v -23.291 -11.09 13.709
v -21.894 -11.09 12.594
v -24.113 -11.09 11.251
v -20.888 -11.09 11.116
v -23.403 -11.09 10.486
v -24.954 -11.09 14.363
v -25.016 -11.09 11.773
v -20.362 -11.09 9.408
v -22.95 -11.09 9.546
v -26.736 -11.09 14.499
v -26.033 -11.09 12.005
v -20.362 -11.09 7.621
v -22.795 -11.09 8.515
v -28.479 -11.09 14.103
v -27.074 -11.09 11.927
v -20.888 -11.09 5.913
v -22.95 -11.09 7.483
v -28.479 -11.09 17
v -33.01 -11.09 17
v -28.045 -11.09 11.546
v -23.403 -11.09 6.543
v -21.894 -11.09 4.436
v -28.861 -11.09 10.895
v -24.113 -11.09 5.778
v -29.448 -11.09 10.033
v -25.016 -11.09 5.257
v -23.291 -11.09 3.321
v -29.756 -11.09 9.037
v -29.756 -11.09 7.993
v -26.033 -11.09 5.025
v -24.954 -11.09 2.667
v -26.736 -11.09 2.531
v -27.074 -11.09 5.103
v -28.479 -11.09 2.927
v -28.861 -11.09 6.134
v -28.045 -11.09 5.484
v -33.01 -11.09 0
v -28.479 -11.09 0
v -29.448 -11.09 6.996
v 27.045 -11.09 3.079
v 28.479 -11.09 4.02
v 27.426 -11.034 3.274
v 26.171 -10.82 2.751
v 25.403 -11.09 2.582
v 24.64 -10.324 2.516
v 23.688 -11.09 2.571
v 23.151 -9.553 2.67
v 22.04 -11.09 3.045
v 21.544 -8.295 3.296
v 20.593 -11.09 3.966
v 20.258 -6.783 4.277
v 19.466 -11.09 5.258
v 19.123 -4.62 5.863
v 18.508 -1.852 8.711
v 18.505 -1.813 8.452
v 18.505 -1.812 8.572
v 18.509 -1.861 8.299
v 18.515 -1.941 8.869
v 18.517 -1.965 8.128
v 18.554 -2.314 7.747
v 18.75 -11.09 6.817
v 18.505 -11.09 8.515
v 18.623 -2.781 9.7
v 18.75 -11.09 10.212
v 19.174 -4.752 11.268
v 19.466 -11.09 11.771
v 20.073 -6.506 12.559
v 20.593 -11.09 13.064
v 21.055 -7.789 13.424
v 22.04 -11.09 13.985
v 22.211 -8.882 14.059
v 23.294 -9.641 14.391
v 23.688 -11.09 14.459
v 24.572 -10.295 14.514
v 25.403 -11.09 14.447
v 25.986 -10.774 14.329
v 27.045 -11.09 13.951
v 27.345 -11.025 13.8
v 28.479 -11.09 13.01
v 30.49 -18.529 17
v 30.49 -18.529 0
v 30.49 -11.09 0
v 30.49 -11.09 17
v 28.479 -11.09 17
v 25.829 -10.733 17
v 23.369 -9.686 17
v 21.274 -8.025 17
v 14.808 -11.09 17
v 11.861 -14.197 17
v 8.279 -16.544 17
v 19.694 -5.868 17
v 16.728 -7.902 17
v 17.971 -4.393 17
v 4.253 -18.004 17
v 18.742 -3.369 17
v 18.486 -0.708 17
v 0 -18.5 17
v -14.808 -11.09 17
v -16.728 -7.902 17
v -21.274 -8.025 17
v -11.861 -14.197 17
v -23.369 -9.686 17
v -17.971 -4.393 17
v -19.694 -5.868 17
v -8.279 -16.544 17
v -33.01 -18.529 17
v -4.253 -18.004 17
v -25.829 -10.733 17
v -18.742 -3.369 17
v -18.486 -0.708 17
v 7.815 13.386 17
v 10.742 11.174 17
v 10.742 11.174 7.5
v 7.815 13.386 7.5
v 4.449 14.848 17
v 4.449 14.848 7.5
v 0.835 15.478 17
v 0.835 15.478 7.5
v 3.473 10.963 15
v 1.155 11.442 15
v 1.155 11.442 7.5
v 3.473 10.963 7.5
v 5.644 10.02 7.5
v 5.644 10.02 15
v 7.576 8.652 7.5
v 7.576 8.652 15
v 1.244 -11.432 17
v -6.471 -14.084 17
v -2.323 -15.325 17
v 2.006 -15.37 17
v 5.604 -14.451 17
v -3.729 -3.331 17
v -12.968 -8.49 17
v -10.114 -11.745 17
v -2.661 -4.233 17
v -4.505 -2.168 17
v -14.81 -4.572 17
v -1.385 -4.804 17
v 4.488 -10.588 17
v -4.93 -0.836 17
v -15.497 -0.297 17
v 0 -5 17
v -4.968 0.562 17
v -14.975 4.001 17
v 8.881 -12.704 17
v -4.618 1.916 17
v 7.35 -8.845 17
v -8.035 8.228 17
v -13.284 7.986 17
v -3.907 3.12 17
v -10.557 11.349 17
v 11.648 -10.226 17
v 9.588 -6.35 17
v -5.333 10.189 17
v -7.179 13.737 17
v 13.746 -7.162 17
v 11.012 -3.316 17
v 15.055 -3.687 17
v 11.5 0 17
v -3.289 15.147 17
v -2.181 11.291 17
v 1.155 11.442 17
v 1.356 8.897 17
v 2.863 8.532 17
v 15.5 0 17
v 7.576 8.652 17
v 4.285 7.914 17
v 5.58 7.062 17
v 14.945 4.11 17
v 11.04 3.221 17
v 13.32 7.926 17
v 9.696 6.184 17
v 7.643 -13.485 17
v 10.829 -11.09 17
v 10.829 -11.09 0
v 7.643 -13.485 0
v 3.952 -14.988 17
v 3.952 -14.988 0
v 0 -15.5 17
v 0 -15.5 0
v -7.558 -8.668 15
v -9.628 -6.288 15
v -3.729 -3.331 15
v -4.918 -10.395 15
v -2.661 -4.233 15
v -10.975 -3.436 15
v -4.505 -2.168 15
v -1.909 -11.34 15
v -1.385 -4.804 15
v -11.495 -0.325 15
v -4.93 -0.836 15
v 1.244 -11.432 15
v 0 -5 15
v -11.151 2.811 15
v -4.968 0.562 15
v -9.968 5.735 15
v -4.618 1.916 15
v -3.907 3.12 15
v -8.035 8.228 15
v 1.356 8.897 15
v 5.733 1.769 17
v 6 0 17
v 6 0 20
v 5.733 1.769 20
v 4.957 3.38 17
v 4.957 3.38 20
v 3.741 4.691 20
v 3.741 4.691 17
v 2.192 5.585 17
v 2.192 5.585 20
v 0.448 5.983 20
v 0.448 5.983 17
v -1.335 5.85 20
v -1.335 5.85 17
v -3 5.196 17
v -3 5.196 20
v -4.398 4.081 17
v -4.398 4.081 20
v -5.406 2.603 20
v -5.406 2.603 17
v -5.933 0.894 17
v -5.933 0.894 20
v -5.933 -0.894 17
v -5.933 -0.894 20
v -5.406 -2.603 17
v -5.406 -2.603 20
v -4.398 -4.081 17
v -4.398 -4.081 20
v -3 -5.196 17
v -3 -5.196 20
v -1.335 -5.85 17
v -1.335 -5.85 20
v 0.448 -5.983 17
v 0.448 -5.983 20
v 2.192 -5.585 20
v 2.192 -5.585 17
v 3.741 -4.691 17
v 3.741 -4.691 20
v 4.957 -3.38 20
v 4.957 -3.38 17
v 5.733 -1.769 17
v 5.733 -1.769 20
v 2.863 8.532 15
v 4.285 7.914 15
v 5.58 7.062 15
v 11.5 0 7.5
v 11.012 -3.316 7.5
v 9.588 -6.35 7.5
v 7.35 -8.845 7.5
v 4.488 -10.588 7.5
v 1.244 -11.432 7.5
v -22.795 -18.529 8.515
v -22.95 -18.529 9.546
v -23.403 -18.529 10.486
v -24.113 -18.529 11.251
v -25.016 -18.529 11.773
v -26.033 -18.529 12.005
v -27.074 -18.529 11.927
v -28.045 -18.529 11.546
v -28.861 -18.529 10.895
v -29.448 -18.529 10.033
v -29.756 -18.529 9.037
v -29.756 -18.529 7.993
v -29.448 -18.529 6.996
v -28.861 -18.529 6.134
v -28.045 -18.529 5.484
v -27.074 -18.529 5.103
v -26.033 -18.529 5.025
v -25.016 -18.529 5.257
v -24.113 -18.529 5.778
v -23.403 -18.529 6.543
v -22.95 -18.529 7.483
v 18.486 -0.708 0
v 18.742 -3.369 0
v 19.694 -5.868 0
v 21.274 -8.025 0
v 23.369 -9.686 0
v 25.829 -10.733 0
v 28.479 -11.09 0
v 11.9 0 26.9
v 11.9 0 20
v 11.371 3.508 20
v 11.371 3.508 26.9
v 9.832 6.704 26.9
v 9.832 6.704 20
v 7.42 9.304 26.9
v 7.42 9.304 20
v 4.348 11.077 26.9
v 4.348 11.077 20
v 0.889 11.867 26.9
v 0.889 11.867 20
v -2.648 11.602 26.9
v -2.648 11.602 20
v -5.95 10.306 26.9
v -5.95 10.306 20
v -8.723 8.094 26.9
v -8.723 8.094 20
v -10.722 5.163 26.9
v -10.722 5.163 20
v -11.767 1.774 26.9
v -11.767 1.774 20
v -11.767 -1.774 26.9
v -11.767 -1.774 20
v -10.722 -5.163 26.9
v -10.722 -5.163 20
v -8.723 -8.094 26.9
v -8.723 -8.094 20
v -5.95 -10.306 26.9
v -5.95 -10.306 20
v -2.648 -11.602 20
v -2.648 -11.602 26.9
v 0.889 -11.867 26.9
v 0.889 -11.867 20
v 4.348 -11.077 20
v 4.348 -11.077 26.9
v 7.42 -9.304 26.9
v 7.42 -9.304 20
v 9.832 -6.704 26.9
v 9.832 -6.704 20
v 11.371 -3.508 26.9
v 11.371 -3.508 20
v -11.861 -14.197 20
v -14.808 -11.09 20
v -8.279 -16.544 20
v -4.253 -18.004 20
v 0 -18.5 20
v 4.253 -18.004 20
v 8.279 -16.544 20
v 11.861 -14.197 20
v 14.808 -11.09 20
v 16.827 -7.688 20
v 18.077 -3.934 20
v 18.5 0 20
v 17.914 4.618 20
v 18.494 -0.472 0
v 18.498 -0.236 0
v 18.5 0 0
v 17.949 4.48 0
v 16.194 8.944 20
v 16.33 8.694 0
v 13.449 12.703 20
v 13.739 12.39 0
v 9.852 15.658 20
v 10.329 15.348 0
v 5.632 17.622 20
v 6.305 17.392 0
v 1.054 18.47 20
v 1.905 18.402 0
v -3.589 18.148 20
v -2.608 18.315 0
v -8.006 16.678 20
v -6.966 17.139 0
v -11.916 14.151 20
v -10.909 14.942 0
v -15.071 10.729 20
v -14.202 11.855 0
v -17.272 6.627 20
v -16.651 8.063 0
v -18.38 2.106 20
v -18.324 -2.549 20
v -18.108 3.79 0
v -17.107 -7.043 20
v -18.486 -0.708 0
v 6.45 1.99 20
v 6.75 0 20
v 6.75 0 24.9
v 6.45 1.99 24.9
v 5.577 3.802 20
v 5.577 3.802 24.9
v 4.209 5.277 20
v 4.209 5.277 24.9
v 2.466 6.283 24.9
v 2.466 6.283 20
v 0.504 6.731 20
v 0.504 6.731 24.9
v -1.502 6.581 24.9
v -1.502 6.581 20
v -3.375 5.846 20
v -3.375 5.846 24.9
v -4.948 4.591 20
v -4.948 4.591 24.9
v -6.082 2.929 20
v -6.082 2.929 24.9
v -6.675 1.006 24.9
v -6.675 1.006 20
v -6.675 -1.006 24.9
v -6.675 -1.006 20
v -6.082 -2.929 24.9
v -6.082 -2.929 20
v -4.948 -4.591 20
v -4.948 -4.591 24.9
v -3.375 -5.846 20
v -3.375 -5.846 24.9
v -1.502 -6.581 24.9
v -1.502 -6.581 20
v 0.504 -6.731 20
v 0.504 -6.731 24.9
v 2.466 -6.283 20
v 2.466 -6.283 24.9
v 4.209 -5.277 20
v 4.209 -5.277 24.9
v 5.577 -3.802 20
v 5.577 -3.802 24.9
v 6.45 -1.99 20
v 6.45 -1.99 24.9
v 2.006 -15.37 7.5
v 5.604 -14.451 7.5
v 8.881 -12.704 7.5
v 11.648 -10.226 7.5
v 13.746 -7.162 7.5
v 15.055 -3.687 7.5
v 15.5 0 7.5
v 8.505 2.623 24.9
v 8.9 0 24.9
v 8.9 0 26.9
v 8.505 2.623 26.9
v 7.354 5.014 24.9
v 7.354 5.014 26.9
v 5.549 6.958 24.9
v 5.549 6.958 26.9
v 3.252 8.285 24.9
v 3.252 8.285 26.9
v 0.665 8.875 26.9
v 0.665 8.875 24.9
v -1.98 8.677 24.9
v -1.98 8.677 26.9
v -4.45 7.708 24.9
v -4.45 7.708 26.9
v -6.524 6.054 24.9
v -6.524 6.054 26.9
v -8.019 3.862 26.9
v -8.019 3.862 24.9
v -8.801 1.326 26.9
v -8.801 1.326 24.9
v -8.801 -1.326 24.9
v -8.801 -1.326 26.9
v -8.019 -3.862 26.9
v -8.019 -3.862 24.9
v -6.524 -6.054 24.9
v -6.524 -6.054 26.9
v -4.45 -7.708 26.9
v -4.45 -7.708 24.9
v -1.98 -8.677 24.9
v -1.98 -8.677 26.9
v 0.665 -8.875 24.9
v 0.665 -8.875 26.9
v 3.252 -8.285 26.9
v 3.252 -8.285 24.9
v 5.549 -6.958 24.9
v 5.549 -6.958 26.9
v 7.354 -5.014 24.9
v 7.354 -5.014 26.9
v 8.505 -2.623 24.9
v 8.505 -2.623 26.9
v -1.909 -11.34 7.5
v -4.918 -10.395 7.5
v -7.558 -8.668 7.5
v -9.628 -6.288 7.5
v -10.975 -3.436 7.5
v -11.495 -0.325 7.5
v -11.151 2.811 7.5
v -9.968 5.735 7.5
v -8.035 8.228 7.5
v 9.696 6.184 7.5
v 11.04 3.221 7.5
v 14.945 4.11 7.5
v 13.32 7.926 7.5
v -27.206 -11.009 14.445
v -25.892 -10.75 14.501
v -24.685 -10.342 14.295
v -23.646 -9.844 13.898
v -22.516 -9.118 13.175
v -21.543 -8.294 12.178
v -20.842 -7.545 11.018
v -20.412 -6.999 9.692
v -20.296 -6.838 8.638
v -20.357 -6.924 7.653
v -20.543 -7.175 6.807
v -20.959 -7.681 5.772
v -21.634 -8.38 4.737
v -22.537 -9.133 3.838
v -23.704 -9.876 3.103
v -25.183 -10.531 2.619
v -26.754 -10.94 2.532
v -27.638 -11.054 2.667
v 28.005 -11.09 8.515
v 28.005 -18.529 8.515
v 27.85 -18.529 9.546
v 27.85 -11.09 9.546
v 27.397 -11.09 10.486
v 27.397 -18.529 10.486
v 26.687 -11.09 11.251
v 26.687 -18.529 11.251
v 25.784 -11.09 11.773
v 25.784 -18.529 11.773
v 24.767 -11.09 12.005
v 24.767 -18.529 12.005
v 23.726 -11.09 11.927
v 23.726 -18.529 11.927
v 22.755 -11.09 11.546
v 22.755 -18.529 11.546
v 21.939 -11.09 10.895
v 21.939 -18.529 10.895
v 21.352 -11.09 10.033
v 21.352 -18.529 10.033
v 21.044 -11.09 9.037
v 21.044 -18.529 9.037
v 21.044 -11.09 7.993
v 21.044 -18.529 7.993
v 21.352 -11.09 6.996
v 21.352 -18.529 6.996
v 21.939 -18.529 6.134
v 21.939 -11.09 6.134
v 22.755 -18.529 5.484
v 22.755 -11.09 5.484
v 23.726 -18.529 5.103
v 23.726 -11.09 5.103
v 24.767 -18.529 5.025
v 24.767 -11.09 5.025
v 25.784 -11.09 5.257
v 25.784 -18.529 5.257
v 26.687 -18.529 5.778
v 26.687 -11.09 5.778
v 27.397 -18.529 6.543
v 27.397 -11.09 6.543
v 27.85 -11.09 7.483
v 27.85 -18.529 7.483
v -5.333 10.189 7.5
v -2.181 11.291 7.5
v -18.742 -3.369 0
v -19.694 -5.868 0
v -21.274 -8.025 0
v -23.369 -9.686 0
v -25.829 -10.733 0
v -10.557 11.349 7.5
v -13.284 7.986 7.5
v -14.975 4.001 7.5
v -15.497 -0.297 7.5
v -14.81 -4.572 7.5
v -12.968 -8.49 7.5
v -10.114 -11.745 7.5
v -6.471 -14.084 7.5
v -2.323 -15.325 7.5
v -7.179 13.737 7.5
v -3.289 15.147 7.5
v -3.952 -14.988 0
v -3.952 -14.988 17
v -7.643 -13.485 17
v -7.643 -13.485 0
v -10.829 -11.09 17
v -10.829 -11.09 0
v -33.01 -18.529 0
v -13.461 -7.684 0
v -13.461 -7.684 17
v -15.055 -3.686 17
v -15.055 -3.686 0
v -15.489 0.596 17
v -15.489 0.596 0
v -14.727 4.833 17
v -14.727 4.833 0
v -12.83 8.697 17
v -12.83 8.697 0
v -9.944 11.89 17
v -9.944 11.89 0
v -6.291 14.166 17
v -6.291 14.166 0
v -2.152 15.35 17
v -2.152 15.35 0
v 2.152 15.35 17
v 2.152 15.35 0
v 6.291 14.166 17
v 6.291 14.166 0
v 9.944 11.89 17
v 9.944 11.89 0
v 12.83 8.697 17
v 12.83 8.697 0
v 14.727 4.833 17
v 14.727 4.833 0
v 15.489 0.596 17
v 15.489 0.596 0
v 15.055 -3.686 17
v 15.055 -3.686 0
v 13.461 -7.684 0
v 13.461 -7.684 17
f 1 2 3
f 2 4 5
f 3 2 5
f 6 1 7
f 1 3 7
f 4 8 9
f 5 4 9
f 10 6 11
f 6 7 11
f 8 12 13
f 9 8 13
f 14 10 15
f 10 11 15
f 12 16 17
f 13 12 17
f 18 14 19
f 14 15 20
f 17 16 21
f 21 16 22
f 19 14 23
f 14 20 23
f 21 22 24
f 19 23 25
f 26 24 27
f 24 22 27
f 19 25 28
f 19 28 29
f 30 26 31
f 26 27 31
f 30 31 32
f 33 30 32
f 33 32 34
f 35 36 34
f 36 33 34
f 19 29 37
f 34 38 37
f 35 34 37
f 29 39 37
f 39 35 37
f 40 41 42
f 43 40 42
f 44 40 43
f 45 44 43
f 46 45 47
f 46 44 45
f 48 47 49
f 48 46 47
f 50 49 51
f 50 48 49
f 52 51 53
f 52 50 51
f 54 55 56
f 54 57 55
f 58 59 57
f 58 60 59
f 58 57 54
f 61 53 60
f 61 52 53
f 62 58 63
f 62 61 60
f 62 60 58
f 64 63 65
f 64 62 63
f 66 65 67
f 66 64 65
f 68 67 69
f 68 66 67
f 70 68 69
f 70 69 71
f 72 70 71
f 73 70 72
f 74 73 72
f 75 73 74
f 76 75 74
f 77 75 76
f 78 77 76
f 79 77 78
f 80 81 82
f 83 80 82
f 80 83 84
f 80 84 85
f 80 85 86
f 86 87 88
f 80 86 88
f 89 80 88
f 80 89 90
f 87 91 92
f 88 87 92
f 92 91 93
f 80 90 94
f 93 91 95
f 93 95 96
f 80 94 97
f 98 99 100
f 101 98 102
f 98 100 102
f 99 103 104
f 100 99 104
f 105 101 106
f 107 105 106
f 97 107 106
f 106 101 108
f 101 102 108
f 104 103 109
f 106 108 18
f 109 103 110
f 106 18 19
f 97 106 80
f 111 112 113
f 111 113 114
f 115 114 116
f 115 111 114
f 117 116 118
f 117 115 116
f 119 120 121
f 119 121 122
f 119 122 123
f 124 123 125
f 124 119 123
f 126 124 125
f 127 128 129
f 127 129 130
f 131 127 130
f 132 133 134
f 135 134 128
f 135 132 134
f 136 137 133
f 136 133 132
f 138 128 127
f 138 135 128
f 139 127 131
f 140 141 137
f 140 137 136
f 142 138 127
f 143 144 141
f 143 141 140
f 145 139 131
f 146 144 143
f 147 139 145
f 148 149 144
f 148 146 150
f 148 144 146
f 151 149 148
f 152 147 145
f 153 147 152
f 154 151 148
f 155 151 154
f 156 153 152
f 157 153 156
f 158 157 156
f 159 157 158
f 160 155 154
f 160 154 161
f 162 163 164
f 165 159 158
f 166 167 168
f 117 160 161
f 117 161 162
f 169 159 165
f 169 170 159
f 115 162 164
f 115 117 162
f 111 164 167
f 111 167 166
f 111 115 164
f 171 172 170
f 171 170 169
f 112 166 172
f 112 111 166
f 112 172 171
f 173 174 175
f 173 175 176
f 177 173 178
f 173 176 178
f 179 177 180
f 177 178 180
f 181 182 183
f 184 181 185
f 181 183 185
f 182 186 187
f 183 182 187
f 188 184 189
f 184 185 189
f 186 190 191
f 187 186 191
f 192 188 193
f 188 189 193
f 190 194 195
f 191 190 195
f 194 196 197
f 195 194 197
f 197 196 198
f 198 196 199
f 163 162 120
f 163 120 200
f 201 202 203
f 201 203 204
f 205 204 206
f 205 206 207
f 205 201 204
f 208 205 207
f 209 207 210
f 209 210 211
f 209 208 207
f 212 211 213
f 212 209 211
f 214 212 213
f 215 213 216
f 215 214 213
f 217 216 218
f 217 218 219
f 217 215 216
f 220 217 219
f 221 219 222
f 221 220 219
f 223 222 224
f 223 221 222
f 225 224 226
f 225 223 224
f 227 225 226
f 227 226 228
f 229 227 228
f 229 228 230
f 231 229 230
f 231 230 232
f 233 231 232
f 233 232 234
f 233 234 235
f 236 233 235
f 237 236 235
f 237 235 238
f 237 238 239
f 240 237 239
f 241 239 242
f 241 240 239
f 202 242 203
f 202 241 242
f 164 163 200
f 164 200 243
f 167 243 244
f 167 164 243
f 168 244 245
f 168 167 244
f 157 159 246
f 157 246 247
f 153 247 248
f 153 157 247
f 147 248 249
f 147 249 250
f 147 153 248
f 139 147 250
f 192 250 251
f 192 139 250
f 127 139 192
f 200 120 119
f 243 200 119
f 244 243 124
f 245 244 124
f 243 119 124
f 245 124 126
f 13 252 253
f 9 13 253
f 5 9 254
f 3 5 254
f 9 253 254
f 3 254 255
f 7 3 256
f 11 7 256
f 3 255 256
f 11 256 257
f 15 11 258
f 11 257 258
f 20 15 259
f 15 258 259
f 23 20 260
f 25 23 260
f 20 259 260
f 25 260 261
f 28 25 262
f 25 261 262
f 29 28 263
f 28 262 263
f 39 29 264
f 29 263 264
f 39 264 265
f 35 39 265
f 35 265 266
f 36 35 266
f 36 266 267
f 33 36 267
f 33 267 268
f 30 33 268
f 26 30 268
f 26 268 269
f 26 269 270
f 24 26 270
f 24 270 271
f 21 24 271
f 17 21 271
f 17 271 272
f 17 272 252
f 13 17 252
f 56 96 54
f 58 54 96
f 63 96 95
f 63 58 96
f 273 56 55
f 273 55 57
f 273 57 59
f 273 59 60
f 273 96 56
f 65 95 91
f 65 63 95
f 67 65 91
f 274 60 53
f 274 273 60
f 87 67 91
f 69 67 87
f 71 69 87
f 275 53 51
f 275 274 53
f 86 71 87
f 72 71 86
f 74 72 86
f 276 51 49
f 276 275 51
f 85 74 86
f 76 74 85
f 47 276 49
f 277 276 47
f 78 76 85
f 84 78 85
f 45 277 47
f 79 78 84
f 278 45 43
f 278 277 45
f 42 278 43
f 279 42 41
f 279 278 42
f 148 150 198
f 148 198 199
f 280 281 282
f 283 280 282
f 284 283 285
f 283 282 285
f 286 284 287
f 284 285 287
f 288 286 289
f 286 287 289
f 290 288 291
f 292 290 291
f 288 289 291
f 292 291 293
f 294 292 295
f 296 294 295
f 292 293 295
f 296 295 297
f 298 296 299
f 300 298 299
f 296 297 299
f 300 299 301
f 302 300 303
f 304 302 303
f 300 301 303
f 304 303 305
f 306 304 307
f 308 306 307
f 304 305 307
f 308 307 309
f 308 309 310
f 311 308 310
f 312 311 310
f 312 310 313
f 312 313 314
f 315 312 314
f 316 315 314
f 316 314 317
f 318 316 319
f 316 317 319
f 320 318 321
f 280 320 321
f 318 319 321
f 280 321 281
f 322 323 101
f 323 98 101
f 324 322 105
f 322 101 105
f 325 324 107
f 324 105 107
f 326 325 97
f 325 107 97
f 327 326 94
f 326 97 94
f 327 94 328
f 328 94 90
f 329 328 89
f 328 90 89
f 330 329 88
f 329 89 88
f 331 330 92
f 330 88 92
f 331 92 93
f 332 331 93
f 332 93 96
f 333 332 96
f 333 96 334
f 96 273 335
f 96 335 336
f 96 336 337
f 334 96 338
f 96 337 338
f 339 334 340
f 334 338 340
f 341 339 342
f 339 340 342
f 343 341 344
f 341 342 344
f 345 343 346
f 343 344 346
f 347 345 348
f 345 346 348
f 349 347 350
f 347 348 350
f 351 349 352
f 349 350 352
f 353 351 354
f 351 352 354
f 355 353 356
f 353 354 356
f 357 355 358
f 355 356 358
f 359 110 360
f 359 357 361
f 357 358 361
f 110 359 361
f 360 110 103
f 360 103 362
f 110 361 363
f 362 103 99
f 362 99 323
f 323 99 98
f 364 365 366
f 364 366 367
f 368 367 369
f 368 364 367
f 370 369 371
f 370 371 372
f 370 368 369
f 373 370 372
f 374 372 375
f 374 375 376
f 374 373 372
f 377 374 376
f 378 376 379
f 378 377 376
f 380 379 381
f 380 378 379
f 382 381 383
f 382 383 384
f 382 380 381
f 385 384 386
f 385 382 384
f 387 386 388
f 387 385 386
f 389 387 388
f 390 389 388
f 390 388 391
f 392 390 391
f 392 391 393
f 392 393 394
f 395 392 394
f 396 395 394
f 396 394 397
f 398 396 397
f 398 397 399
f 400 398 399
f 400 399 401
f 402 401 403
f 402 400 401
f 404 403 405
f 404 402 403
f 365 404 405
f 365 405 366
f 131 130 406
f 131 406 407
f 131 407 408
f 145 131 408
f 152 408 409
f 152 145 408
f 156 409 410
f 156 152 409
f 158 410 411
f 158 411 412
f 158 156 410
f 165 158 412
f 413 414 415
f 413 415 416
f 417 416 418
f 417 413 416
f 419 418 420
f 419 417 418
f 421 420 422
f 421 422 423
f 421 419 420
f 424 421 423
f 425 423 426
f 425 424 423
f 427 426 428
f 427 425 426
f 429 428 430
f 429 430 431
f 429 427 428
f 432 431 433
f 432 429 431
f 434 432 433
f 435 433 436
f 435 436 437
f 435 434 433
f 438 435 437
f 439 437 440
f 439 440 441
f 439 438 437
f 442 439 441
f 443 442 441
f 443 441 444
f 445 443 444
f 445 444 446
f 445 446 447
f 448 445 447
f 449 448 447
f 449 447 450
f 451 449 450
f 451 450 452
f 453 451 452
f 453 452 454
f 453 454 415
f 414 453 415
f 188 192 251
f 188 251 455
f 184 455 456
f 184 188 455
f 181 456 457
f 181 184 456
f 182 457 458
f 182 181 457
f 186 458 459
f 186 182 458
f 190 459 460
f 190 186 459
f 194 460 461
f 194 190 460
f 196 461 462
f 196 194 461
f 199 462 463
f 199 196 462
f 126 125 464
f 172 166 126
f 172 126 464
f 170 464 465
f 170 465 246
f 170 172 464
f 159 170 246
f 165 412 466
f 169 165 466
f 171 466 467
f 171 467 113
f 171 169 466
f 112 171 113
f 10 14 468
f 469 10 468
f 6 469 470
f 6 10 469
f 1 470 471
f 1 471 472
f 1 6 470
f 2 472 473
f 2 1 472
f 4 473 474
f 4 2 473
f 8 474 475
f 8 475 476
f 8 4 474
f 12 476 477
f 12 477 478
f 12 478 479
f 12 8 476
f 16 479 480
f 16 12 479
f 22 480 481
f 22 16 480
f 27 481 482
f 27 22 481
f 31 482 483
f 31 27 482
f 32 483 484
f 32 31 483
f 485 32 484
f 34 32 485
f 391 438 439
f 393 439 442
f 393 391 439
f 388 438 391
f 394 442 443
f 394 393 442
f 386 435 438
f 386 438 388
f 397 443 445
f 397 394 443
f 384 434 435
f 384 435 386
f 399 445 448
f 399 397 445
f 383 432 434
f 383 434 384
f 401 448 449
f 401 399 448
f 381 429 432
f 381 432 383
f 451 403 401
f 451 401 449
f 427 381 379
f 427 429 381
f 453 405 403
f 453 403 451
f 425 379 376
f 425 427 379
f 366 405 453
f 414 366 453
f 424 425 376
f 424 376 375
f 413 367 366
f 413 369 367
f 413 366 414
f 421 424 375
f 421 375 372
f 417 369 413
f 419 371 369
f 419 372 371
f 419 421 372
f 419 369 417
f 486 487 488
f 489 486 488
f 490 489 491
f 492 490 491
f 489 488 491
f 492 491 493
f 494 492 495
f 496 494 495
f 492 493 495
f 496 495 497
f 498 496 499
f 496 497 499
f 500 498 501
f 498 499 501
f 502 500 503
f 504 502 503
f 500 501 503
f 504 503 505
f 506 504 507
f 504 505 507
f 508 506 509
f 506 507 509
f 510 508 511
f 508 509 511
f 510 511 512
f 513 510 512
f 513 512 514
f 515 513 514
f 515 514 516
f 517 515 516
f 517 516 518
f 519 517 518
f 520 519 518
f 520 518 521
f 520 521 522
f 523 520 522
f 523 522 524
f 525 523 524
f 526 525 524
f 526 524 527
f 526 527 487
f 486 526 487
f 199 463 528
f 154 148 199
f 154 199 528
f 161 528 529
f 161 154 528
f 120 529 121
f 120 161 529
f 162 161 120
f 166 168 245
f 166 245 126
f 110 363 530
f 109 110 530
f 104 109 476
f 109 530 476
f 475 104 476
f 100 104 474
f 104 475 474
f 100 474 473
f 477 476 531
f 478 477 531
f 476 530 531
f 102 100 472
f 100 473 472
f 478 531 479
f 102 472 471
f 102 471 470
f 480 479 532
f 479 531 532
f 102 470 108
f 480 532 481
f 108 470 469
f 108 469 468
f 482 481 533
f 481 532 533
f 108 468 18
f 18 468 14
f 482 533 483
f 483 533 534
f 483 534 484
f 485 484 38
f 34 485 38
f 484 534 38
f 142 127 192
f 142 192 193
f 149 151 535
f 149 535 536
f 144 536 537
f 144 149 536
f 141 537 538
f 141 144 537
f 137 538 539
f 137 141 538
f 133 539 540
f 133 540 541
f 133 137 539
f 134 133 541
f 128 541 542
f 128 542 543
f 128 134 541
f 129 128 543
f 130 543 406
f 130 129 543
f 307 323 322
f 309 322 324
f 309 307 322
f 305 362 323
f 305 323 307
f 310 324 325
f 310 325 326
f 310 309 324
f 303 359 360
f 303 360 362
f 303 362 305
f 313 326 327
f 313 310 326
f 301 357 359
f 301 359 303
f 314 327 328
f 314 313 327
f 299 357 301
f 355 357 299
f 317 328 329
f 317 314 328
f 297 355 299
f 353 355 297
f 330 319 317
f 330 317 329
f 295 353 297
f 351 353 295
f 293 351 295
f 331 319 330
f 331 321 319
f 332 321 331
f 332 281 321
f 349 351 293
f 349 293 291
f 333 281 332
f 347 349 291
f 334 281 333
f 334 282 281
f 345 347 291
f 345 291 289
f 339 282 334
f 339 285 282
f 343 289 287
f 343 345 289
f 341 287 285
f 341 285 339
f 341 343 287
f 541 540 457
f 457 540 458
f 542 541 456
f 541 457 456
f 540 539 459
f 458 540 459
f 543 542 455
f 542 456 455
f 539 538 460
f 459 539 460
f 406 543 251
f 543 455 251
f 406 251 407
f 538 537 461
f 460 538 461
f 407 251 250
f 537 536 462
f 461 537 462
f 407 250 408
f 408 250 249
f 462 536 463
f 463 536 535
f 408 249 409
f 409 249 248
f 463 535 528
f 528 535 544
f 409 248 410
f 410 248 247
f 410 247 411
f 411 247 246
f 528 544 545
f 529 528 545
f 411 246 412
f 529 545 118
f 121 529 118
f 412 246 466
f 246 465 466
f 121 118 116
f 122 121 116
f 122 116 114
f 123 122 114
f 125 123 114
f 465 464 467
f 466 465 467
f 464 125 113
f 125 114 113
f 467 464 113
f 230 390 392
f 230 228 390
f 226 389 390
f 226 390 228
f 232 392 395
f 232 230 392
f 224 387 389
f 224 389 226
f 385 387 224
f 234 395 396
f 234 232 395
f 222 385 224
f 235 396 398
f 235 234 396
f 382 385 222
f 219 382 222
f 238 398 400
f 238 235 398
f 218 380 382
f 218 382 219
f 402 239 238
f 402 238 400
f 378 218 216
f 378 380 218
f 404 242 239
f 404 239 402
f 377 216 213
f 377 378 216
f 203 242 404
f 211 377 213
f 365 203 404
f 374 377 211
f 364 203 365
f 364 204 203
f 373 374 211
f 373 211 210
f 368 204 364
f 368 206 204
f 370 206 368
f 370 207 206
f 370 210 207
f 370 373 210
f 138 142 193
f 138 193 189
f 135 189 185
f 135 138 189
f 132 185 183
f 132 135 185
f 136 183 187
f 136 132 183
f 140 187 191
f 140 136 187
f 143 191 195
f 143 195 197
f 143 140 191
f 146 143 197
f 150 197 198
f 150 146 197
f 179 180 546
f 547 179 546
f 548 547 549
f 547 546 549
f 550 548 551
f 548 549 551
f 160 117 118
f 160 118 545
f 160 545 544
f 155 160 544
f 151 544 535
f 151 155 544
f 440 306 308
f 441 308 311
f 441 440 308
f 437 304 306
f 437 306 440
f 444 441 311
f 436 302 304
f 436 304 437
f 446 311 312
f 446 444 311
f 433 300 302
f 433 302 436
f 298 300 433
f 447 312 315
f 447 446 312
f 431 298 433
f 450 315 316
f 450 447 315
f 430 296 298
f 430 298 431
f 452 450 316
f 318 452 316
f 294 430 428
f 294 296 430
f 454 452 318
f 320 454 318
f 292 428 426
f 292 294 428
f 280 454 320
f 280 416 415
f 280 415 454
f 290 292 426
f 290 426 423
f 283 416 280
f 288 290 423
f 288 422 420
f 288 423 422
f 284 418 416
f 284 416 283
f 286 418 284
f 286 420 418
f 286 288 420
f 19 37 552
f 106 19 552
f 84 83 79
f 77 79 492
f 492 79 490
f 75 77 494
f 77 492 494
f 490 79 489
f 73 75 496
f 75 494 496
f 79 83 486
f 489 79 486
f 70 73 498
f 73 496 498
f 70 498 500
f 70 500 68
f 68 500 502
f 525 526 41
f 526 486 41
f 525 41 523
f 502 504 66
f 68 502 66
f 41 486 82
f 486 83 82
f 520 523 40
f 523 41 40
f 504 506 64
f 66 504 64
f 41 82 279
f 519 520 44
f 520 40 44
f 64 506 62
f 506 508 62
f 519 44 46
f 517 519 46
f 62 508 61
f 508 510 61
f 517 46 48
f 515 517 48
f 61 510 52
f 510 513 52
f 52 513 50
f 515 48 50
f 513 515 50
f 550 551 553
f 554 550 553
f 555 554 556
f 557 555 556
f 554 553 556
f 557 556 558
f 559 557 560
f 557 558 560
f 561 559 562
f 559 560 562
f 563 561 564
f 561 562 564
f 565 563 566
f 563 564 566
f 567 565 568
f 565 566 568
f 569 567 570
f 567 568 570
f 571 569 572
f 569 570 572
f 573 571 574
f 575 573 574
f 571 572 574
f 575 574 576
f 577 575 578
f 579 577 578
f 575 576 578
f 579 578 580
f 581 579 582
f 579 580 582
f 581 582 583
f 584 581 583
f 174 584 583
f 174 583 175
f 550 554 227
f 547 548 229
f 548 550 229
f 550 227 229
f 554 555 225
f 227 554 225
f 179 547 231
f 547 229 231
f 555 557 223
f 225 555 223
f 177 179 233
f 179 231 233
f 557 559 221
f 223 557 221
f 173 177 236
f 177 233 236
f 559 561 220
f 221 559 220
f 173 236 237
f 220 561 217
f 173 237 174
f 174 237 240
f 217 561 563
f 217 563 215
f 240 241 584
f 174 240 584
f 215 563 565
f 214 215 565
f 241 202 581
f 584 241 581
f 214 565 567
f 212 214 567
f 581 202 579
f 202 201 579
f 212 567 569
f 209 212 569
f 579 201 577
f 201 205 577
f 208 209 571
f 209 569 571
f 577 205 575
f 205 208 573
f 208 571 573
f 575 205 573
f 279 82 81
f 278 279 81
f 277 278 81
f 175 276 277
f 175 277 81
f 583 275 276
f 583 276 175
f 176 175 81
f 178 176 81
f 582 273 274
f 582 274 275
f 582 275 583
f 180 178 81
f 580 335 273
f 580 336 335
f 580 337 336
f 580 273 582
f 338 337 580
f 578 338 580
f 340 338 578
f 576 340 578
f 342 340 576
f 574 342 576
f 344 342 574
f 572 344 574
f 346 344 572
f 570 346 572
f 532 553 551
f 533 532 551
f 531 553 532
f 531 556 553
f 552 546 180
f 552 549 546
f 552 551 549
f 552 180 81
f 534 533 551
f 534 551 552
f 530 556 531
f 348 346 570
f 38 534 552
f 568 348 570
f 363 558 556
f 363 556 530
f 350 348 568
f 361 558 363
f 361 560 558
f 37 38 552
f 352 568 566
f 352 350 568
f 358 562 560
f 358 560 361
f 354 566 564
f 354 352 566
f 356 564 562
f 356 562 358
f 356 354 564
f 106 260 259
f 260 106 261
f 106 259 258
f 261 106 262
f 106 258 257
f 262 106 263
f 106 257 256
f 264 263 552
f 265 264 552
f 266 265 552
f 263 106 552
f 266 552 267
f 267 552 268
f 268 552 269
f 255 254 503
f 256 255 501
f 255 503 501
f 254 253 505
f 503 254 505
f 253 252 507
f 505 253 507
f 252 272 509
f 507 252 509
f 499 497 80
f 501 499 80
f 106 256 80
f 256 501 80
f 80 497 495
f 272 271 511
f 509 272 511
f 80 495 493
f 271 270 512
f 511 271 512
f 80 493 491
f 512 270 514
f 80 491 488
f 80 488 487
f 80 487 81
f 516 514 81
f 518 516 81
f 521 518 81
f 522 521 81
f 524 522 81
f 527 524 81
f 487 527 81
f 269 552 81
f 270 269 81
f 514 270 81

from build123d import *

# Parameters (mm, degrees)
F1_DEPTH    = 17
F3_DEPTH    = 9.5
F4_DEPTH    = 2
F5_R        = 15.5
F5_R_2      = 6
F6_DEPTH    = 3
F7_R        = 11.9
F7_R_2      = 8.9
F8_DEPTH    = 6.9
F9_T1_DEPTH = 17
F10_R       = 3.5
F11_DEPTH   = 37.0302756021
F13_DEPTH   = 29.5909779782
F14_R       = 6
F15_DEPTH   = 29.5909779782
F7_R_3      = 6.75
F16_DEPTH   = 4.9


# Not quite as in the source:
# - a fillet or chamfer that OpenCascade refuses, or shapes differently, is made with other operations: its cross-section is extruded or revolved along the edge and cut away or added
# - a feature names something its author has since deleted; it is built from what else it names


with BuildPart() as f1:
    # F0 (on Top) → F1 (new body)
    with BuildSketch(Plane.XY):
        with BuildLine():
            ThreePointArc((0, -15.5), (-5.8461671777, -14.3552195849), (-10.8287759439, -11.0899779782))
            Line((-10.8287759439, -11.0899779782), (-14.8075112171, -11.0899779782))
            ThreePointArc((-14.8075112171, -11.0899779782), (-12.6472106411, -13.5017799938), (-10.0995049384, -15.5))
            Line((-10.0995049384, -15.5), (0, -15.5))
        make_face()
        with BuildLine():
            Line((14.8075112171, -11.0899779782), (10.8287759439, -11.0899779782))
            ThreePointArc((10.8287759439, -11.0899779782), (5.8461671777, -14.3552195849), (0, -15.5))
            Line((0, -15.5), (10.0995049384, -15.5))
            ThreePointArc((10.0995049384, -15.5), (12.6472106411, -13.5017799938), (14.8075112171, -11.0899779782))
        make_face()
        with BuildLine():
            ThreePointArc((-10.8287759439, -11.0899779782), (-6.0168086586, 14.2845375692), (15.5, 0))
            ThreePointArc((15.5, 0), (14.2845375692, -6.0168086586), (10.8287759439, -11.0899779782))
            Line((10.8287759439, -11.0899779782), (14.8075112171, -11.0899779782))
            ThreePointArc((14.8075112171, -11.0899779782), (17.5526202818, -5.8442725161), (18.5, 0))
            ThreePointArc((18.5, 0), (-5.8442725161, 17.5526202818), (-14.8075112171, -11.0899779782))
            Line((-14.8075112171, -11.0899779782), (-10.8287759439, -11.0899779782))
        make_face()
        with BuildLine():
            Line((30.4899009168, -15.5), (10.0995049384, -15.5))
            ThreePointArc((10.0995049384, -15.5), (0, -18.5), (-10.0995049384, -15.5))
            Line((-10.0995049384, -15.5), (-33.0100990832, -15.5))
            Line((-33.0100990832, -15.5), (-33.0100990832, -18.5292756021))
            Line((-33.0100990832, -18.5292756021), (30.4899009168, -18.5292756021))
            Line((30.4899009168, -18.5292756021), (30.4899009168, -15.5))
        make_face()
        with BuildLine():
            Line((30.4899009168, -11.0899779782), (14.8075112171, -11.0899779782))
            ThreePointArc((14.8075112171, -11.0899779782), (12.6472106411, -13.5017799938), (10.0995049384, -15.5))
            Line((10.0995049384, -15.5), (30.4899009168, -15.5))
            Line((30.4899009168, -15.5), (30.4899009168, -11.0899779782))
        make_face()
        with BuildLine():
            ThreePointArc((-10.0995049384, -15.5), (-12.6472106411, -13.5017799938), (-14.8075112171, -11.0899779782))
            Line((-14.8075112171, -11.0899779782), (-33.0100990832, -11.0899779782))
            Line((-33.0100990832, -11.0899779782), (-33.0100990832, -15.5))
            Line((-33.0100990832, -15.5), (-10.0995049384, -15.5))
        make_face()
        with BuildLine():
            Line((10.0995049384, -15.5), (0, -15.5))
            Line((0, -15.5), (-10.0995049384, -15.5))
            ThreePointArc((-10.0995049384, -15.5), (0, -18.5), (10.0995049384, -15.5))
        make_face()
    extrude(amount=F1_DEPTH)

    # F5 (on face) → F6 (join)
    with BuildSketch(Plane.XY.offset(17)):
        with BuildLine():
            ThreePointArc((14.8075112171, -11.0899779782), (17.5526202818, -5.8442725161), (18.5, 0))
            ThreePointArc((18.5, 0), (-5.8442725161, 17.5526202818), (-14.8075112171, -11.0899779782))
            ThreePointArc((-14.8075112171, -11.0899779782), (0, -18.5), (14.8075112171, -11.0899779782))
        make_face()
        Circle(F5_R, mode=Mode.SUBTRACT)
        Circle(F5_R)
        Circle(F5_R_2, mode=Mode.SUBTRACT)
    extrude(amount=F6_DEPTH)

    # F7 (on face) → F8 (join)
    with BuildSketch(Plane.XY.offset(20)):
        Circle(F7_R)
        Circle(F7_R_2, mode=Mode.SUBTRACT)
    extrude(amount=F8_DEPTH)

    # F9: fillet of radius 10 on 2 edges, made by hand

    # F9_s2 → F9_t1 (join)
    with BuildSketch(Plane.XY):
        with BuildLine():
            ThreePointArc((18.486465371, -0.7075295648), (21.2741342918, -8.0245116996), (28.4791493554, -11.0899779782))
            Line((28.4791493554, -11.0899779782), (14.8075112171, -11.0899779782))
            ThreePointArc((14.8075112171, -11.0899779782), (17.4376325236, -6.1789134946), (18.486465371, -0.7075295648))
        make_face()
        with BuildLine():
            ThreePointArc((-18.486465371, -0.7075295648), (-21.2741342918, -8.0245116996), (-28.4791493554, -11.0899779782))
            Line((-28.4791493554, -11.0899779782), (-14.8075112171, -11.0899779782))
            ThreePointArc((-14.8075112171, -11.0899779782), (-17.4376325236, -6.1789134946), (-18.486465371, -0.7075295648))
        make_face()
    extrude(amount=F9_T1_DEPTH)

    # F10 (on face) → F11 (cut, through all)
    with BuildSketch(Plane.XZ.offset(18.5292756021)):
        with Locations((-26.2949950993, 8.5148541257)):
            Circle(F10_R)
        with Locations((24.5050049007, 8.5148541257)):
            Circle(F10_R)
    extrude(amount=-F11_DEPTH, mode=Mode.SUBTRACT)

    # F12 (on face) → F13 (cut, through all)
    with BuildSketch(Plane(origin=(0, -11.0899779782, 0), x_dir=(-1, 0, 0), z_dir=(0, 1, 0))):
        with BuildLine():
            Line((28.4791493554, 11.2497161305), (28.4791493554, 14.1031875253))
            ThreePointArc((28.4791493554, 14.1031875253), (20.2949950993, 8.5148541257), (28.4791493554, 2.926520726))
            Line((28.4791493554, 2.926520726), (28.4791493554, 5.7799921208))
            ThreePointArc((28.4791493554, 5.7799921208), (29.7949950993, 8.5148541257), (28.4791493554, 11.2497161305))
        make_face()
        with BuildLine():
            ThreePointArc((28.4791493554, 2.926520726), (31.2500392735, 5.1314331894), (32.2949950993, 8.5148541257))
            ThreePointArc((32.2949950993, 8.5148541257), (31.2500392735, 11.8982750619), (28.4791493554, 14.1031875253))
            Line((28.4791493554, 14.1031875253), (28.4791493554, 11.2497161305))
            ThreePointArc((28.4791493554, 11.2497161305), (29.7949950993, 8.5148541257), (28.4791493554, 5.7799921208))
            Line((28.4791493554, 5.7799921208), (28.4791493554, 2.926520726))
        make_face()
    extrude(amount=F13_DEPTH, mode=Mode.SUBTRACT)

    # F14 (on face) → F15 (cut, through all)
    with BuildSketch(Plane(origin=(0, -11.0899779782, 0), x_dir=(-1, 0, 0), z_dir=(0, 1, 0))):
        with Locations((-24.5050049007, 8.5148541257)):
            Circle(F14_R)
    extrude(amount=F15_DEPTH, mode=Mode.SUBTRACT)

    # F7 (on face) → F16 (join)
    with BuildSketch(Plane.XY.offset(20)):
        Circle(F7_R_2)
        Circle(F7_R_3, mode=Mode.SUBTRACT)
    extrude(amount=F16_DEPTH)


with BuildPart() as f3:
    # F2 (on face) → F3 (new body)
    with BuildSketch(Plane.XY.offset(17)):
        with BuildLine():
            Line((10.7419644717, 11.1740860605), (7.5760127927, 8.651822361))
            ThreePointArc((7.5760127927, 8.651822361), (10.473159674, 4.7500448884), (11.5, 0))
            ThreePointArc((11.5, 0), (8.5603531215, -7.6792157435), (1.2442861853, -11.4324866888))
            Line((1.2442861853, -11.4324866888), (2.0058842699, -15.3696593422))
            ThreePointArc((2.0058842699, -15.3696593422), (11.6477724519, -10.2264068425), (15.5, 0))
            ThreePointArc((15.5, 0), (14.2609685735, 6.0724604029), (10.7419644717, 11.1740860605))
        make_face()
        with BuildLine():
            Line((0.8345908665, 15.4775145965), (1.1546689089, 11.4418853215))
            ThreePointArc((1.1546689089, 11.4418853215), (4.5828281197, 10.5474018803), (7.5760127927, 8.651822361))
            Line((7.5760127927, 8.651822361), (10.7419644717, 11.1740860605))
            ThreePointArc((10.7419644717, 11.1740860605), (6.1752759182, 14.2167495348), (0.8345908665, 15.4775145965))
        make_face()
        with BuildLine():
            ThreePointArc((-8.0347933894, 8.2275205979), (-3.7969808217, 10.855088053), (1.1546689089, 11.4418853215))
            Line((1.1546689089, 11.4418853215), (0.8345908665, 15.4775145965))
            ThreePointArc((0.8345908665, 15.4775145965), (-5.2813630167, 14.5724810752), (-10.5570475908, 11.3489535274))
            Line((-10.5570475908, 11.3489535274), (-8.0347933894, 8.2275205979))
        make_face()
        with BuildLine():
            ThreePointArc((1.2442861853, -11.4324866888), (-10.3998422416, -4.9084907405), (-8.0347933894, 8.2275205979))
            Line((-8.0347933894, 8.2275205979), (-10.5570475908, 11.3489535274))
            ThreePointArc((-10.5570475908, 11.3489535274), (-14.0268195595, -6.5953266065), (2.0058842699, -15.3696593422))
            Line((2.0058842699, -15.3696593422), (1.2442861853, -11.4324866888))
        make_face()
    extrude(amount=-F3_DEPTH)

    # F2 (on face) → F4 (join)
    with BuildSketch(Plane.XY.offset(17)):
        with BuildLine():
            Line((-3.9074059307, 3.119644033), (-8.0347933894, 8.2275205979))
            ThreePointArc((-8.0347933894, 8.2275205979), (-10.3998422416, -4.9084907405), (1.2442861853, -11.4324866888))
            Line((1.2442861853, -11.4324866888), (0, -5))
            ThreePointArc((0, -5), (-4.5054533715, -2.1681535733), (-3.9074059307, 3.119644033))
        make_face()
        with BuildLine():
            Line((1.1546689089, 11.4418853215), (1.3564967681, 8.8971858763))
            ThreePointArc((1.3564967681, 8.8971858763), (3.5875748475, 8.2540478987), (5.5798650145, 7.0615229533))
            Line((5.5798650145, 7.0615229533), (7.5760127927, 8.651822361))
            ThreePointArc((7.5760127927, 8.651822361), (4.5828281197, 10.5474018803), (1.1546689089, 11.4418853215))
        make_face()
    extrude(amount=-F4_DEPTH)


solid = Compound([f1.part, f3.part])
